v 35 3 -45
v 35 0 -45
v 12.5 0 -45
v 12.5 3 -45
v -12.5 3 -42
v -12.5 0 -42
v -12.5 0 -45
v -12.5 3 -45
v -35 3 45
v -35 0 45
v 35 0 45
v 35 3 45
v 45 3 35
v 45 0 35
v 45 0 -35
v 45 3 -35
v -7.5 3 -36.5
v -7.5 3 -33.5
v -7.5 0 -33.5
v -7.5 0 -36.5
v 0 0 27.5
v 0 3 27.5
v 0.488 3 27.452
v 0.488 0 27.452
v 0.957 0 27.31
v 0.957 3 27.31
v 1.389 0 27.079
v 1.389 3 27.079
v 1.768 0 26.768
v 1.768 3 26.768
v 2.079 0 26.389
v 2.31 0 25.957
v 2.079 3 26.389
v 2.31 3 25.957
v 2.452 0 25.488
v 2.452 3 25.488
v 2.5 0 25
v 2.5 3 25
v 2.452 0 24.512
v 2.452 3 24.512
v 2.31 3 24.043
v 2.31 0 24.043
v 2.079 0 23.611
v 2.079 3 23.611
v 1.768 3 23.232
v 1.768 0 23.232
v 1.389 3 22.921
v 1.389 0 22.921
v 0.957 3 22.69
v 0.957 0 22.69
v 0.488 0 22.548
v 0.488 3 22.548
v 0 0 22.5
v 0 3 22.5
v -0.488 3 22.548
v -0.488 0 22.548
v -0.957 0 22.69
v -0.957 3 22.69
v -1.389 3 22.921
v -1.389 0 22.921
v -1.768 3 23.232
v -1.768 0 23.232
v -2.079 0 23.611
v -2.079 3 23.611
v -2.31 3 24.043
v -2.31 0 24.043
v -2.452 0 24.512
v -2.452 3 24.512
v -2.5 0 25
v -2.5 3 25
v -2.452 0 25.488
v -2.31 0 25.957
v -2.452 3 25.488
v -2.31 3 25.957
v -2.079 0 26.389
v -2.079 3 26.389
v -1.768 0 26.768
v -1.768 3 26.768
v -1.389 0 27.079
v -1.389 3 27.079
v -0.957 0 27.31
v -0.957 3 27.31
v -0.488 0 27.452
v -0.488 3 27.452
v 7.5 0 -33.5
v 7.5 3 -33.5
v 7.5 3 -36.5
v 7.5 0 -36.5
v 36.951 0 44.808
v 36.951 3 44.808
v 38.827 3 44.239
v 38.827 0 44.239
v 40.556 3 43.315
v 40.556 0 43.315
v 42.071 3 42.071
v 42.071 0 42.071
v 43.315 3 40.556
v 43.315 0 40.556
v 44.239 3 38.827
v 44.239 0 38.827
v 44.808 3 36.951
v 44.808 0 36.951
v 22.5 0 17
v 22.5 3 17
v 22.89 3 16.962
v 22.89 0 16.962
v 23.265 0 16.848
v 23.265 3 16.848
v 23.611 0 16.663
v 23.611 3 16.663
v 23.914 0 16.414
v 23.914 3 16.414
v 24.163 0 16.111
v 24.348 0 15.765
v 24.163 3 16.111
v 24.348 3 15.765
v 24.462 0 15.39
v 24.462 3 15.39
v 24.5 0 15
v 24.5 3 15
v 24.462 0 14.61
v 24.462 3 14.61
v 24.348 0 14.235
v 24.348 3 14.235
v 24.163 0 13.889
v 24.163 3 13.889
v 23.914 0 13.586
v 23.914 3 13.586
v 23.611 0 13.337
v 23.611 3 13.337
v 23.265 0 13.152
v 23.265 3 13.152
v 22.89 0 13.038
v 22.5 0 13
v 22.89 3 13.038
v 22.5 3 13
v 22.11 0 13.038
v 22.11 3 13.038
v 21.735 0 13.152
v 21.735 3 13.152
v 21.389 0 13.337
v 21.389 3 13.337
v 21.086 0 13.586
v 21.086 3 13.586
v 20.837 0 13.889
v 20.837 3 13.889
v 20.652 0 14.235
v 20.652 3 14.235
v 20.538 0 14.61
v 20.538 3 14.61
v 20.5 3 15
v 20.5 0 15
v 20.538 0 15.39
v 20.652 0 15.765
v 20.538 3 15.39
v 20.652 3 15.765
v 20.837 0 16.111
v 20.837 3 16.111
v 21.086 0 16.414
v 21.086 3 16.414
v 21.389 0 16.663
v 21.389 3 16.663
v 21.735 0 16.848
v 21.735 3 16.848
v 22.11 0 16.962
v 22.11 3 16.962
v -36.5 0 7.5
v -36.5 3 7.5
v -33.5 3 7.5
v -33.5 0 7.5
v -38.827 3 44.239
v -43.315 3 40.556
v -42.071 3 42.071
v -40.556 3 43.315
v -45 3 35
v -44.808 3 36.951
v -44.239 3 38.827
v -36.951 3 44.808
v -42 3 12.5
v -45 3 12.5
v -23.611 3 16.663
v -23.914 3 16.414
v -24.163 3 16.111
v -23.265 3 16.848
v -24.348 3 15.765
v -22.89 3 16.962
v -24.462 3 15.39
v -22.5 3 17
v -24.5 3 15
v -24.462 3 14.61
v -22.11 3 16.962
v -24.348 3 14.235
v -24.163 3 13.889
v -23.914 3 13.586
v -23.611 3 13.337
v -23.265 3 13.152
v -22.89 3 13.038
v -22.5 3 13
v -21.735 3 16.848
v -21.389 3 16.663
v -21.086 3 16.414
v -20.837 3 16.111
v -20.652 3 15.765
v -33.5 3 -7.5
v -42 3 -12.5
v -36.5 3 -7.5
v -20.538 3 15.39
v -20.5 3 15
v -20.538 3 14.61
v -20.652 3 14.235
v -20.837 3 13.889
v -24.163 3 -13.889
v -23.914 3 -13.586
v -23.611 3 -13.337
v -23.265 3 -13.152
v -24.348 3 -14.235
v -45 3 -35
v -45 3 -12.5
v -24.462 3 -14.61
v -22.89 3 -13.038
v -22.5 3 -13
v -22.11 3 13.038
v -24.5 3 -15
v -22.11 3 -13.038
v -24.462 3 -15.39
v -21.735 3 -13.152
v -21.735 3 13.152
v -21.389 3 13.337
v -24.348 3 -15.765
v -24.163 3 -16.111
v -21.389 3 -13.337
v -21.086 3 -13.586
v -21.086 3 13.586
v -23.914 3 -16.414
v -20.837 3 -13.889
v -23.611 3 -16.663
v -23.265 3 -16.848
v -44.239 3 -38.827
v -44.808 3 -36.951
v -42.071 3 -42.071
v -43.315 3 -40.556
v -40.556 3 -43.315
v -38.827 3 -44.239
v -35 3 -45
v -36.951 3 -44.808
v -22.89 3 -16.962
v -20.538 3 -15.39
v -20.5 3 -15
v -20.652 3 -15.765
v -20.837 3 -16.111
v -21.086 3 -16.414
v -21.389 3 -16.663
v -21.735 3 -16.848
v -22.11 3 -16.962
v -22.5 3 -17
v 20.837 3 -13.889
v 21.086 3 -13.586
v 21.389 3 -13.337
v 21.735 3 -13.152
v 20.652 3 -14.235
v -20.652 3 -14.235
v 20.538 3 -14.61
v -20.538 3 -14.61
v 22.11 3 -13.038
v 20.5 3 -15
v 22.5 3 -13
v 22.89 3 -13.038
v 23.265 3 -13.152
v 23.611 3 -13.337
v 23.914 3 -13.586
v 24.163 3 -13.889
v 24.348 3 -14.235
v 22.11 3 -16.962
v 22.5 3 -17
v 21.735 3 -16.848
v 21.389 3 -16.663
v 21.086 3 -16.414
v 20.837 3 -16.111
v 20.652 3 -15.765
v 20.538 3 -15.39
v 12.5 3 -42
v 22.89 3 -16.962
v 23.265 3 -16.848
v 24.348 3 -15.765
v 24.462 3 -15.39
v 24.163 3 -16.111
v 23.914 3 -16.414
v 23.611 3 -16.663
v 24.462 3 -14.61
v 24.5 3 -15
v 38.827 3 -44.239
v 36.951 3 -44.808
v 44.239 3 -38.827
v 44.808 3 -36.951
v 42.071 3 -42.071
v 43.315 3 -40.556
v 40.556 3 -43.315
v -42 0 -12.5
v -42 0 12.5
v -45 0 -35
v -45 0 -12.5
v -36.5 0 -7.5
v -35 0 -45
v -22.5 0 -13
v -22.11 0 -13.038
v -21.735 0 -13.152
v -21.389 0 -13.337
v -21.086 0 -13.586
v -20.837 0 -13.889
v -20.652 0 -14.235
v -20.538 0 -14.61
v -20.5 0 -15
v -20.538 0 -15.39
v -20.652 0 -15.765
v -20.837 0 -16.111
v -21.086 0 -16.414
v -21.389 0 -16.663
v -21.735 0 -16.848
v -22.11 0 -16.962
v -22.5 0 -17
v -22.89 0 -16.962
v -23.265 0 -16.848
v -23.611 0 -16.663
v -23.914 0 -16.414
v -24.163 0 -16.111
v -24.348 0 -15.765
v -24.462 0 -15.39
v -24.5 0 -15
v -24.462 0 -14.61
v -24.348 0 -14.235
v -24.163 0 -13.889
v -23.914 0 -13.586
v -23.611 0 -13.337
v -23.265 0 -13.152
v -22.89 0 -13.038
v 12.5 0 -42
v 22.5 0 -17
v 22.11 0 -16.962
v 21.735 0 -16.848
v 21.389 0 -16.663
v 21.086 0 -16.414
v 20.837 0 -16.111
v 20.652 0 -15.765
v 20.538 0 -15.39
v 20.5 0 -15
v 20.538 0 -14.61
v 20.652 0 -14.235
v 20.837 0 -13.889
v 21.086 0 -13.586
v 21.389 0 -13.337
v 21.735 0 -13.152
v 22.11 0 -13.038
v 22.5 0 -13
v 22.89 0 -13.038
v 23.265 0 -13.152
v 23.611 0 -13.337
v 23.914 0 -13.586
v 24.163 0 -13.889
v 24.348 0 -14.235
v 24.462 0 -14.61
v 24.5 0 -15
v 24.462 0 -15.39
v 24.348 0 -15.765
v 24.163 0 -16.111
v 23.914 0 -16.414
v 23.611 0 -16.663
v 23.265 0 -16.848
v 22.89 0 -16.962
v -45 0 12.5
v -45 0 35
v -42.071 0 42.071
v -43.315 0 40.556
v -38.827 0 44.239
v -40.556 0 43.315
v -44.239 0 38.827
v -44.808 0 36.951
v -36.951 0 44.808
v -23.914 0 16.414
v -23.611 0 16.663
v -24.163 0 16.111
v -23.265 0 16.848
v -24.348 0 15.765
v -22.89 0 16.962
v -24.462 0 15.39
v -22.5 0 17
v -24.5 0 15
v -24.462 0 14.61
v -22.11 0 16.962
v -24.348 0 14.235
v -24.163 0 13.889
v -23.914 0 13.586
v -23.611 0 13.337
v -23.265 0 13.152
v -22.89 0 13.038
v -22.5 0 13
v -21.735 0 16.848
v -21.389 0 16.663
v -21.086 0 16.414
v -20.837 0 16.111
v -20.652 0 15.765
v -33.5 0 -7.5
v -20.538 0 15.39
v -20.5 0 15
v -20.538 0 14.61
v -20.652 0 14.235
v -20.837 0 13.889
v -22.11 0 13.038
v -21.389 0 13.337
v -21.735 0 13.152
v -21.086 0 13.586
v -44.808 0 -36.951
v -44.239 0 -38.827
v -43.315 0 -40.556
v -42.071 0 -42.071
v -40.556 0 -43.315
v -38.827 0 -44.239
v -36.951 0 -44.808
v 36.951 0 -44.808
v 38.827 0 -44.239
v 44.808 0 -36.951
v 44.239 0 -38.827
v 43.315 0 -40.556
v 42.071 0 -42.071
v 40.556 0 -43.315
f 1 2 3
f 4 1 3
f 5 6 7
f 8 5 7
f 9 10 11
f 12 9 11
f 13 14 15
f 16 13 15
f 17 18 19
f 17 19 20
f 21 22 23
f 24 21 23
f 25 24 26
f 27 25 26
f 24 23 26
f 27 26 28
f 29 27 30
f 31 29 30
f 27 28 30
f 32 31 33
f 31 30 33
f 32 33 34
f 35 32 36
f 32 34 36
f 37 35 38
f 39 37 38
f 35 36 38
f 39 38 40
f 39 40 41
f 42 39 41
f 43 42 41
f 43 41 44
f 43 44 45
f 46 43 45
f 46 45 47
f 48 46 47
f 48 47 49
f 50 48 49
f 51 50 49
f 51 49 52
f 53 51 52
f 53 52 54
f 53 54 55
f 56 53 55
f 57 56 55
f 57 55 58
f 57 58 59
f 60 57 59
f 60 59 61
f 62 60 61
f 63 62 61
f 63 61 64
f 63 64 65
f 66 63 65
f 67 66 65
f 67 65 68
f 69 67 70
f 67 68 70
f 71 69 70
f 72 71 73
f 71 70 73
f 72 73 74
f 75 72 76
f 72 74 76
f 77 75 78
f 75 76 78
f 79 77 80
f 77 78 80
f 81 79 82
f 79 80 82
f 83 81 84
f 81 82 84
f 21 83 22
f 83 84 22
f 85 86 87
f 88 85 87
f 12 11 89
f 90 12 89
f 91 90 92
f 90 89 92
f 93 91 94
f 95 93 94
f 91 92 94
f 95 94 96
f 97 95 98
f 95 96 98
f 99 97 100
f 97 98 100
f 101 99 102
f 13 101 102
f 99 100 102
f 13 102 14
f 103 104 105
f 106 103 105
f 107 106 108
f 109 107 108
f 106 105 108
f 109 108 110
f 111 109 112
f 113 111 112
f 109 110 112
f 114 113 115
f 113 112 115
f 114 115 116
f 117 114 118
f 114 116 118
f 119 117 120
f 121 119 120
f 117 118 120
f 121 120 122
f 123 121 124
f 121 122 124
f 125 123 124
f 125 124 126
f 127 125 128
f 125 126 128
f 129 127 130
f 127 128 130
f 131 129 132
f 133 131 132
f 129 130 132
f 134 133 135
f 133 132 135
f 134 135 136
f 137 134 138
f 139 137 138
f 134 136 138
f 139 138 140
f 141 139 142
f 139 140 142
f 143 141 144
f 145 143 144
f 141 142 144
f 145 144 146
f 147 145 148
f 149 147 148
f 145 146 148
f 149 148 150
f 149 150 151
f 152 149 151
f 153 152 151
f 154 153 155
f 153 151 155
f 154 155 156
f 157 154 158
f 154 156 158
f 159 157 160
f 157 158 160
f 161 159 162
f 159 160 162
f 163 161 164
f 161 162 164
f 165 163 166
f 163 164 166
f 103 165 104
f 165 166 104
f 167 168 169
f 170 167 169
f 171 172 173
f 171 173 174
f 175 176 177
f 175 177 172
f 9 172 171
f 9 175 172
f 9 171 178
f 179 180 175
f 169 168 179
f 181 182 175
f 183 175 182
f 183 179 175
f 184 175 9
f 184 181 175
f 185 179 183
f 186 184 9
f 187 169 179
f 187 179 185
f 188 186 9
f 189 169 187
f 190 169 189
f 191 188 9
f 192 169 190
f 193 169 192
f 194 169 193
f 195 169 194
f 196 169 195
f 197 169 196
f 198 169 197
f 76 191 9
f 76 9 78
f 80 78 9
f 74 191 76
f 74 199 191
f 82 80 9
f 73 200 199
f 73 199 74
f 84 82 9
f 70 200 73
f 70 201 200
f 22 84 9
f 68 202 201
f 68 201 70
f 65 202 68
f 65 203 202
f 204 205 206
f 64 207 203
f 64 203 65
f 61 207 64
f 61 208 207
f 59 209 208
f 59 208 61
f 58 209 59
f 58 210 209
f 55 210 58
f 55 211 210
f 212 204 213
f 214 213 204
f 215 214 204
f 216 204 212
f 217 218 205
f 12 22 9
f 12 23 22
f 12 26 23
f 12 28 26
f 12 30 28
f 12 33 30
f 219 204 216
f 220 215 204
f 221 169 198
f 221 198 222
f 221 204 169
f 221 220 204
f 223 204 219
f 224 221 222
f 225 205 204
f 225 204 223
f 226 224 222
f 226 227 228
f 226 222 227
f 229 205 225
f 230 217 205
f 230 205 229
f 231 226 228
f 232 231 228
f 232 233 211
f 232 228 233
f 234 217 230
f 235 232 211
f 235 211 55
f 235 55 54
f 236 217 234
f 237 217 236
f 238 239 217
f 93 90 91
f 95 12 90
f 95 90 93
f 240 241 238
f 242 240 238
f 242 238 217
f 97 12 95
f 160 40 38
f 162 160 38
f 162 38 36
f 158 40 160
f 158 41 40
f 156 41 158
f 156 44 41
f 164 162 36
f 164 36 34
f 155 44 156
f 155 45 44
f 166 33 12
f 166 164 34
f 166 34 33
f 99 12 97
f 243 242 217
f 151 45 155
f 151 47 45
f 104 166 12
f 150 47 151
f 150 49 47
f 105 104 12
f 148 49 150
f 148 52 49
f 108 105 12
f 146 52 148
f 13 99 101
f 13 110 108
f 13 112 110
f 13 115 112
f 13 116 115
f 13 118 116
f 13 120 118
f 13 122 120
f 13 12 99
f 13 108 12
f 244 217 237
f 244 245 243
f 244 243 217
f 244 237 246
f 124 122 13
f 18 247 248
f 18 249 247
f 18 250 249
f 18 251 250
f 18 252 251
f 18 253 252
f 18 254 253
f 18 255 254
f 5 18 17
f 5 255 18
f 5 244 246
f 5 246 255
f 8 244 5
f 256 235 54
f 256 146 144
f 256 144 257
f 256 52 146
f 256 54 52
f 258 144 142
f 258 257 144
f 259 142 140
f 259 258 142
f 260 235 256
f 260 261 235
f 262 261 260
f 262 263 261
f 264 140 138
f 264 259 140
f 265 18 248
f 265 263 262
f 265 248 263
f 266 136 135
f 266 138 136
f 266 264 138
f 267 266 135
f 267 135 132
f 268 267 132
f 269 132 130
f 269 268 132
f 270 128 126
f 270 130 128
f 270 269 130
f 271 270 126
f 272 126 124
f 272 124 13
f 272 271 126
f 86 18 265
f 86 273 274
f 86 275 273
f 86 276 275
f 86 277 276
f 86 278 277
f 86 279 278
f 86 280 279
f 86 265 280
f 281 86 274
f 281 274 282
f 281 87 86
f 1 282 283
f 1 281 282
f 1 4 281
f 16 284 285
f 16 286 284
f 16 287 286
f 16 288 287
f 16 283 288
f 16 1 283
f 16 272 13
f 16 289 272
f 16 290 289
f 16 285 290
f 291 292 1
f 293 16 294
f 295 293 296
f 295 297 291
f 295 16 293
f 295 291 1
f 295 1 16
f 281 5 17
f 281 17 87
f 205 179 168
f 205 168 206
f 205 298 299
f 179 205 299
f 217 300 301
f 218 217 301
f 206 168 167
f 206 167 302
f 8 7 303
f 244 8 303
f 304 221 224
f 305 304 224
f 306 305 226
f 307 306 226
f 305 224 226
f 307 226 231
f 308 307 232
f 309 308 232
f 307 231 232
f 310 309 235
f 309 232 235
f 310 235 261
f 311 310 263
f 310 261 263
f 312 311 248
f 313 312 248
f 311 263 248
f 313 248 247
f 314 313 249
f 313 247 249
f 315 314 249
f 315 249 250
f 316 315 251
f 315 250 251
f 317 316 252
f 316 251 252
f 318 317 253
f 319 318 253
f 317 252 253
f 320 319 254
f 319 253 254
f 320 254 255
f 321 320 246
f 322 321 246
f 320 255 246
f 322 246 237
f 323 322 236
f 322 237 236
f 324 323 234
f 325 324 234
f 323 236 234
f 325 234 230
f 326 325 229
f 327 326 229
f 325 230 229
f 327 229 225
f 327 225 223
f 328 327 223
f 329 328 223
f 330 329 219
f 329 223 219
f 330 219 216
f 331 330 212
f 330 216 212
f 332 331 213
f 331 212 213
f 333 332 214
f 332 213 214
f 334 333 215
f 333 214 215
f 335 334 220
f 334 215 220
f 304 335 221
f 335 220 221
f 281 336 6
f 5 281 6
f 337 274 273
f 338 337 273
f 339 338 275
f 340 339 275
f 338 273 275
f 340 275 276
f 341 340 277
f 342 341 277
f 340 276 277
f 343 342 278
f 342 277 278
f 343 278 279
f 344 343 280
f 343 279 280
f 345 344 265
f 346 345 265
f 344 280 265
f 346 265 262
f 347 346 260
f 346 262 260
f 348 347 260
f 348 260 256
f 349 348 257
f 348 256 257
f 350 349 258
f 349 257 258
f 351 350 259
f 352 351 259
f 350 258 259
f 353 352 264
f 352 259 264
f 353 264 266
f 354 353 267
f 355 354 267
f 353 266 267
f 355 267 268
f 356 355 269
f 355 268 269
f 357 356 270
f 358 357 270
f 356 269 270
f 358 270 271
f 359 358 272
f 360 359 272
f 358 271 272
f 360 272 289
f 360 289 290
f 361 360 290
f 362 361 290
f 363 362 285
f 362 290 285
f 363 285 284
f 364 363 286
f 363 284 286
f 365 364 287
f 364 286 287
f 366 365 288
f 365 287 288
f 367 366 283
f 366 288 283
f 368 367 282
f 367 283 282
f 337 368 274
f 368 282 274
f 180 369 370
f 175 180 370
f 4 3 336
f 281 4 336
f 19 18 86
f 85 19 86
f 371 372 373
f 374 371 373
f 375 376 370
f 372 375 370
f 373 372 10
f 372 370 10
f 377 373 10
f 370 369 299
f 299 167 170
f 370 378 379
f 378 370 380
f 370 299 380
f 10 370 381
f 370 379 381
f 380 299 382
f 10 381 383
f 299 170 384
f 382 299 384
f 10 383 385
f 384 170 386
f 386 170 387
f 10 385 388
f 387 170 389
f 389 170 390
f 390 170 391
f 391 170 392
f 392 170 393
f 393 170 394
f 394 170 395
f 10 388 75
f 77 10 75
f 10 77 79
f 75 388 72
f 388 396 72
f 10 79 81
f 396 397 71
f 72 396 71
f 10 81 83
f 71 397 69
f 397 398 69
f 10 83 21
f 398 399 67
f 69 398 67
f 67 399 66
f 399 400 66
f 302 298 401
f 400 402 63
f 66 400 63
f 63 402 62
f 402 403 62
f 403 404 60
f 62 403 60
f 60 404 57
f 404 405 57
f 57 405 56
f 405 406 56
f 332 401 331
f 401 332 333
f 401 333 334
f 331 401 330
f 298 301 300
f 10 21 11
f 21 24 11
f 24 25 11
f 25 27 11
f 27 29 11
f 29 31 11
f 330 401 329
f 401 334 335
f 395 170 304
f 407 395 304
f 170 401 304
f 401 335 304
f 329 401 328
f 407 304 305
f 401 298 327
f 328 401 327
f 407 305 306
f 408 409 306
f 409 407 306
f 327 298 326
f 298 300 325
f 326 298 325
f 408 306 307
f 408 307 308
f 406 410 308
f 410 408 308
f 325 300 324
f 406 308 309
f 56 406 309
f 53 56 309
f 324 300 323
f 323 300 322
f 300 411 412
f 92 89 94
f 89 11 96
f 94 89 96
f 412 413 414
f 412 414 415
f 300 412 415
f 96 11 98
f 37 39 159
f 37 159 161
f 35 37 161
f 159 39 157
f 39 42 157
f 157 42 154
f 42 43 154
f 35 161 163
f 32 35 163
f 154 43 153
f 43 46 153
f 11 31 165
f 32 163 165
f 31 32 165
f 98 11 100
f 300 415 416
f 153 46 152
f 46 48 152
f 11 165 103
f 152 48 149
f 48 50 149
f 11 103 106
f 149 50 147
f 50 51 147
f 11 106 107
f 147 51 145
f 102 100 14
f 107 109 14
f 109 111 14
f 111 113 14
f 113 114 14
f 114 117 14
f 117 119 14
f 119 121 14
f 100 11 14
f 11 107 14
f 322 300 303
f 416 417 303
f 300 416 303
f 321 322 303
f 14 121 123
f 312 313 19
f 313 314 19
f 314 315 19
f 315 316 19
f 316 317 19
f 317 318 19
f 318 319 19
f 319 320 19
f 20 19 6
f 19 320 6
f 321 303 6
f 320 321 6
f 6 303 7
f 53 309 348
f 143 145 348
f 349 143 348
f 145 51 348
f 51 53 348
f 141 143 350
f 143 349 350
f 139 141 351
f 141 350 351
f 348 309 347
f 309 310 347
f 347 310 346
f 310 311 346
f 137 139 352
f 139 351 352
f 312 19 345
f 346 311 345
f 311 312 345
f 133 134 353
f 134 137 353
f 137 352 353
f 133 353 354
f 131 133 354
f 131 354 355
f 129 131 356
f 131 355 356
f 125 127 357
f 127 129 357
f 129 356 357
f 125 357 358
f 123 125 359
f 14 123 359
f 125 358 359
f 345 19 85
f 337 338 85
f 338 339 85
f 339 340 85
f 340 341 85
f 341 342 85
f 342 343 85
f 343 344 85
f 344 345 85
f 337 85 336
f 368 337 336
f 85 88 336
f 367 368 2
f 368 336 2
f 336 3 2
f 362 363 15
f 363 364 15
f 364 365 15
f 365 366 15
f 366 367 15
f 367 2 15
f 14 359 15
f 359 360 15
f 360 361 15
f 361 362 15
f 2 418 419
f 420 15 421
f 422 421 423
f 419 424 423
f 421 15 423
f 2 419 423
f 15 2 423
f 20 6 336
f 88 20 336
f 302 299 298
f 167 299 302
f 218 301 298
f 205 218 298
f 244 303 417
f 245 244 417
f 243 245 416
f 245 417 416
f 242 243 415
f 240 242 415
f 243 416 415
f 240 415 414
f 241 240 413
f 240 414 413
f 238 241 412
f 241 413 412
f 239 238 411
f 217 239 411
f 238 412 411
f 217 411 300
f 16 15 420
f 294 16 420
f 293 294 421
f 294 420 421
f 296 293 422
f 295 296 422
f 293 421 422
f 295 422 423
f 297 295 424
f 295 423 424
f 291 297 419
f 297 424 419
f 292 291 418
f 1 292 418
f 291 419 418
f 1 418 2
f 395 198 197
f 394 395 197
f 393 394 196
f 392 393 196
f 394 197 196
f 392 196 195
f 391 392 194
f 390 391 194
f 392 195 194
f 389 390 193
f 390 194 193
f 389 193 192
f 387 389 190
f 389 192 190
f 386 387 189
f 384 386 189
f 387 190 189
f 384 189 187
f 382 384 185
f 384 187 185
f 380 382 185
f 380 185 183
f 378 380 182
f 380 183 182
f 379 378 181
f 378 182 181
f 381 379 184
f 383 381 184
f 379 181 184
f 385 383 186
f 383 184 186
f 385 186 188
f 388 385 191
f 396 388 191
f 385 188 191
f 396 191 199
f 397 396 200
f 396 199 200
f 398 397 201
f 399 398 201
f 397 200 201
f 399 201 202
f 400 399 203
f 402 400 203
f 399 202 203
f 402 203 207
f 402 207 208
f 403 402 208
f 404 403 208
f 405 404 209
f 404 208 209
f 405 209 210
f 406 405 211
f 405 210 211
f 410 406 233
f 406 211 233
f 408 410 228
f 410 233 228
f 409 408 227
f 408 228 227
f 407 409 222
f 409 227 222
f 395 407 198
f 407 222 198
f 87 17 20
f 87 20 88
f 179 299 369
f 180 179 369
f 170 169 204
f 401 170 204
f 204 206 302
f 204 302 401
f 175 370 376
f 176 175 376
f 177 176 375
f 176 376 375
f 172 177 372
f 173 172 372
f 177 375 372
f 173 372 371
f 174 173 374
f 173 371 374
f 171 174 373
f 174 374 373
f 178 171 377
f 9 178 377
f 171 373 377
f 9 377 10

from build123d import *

# Parameters (mm, degrees)
BOSS_EXTRUDE1_DEPTH = 3
SKETCH2_R           = 2
CUT_EXTRUDE1_DEPTH  = 3
SKETCH3_W           = 15
SKETCH3_H           = 3
SKETCH3_W_2         = 3
SKETCH3_H_2         = 15
CUT_EXTRUDE2_DEPTH  = 10
SKETCH4_R           = 2.5
CUT_EXTRUDE3_DEPTH  = 14


with BuildPart() as part:
    # Sketch1 → Boss-Extrude1 (new body)
    with BuildSketch(Plane(origin=(0, 0, 0), x_dir=(1, 0, 0), z_dir=(0, 1, 0))):
        with BuildLine():
            Line((-35, -45), (35, -45))
            ThreePointArc((35, -45), (42.071067812, -42.071067812), (45, -35))
            Line((45, -35), (45, 35))
            ThreePointArc((45, 35), (42.071067812, 42.071067812), (35, 45))
            Line((35, 45), (12.5, 45))
            Line((12.5, 45), (12.5, 42))
            Line((12.5, 42), (-12.5, 42))
            Line((-12.5, 42), (-12.5, 45))
            Line((-12.5, 45), (-35, 45))
            ThreePointArc((-35, 45), (-42.071067812, 42.071067812), (-45, 35))
            Line((-45, 35), (-45, 12.5))
            Line((-45, 12.5), (-42, 12.5))
            Line((-42, 12.5), (-42, -12.5))
            Line((-42, -12.5), (-45, -12.5))
            Line((-45, -12.5), (-45, -35))
            ThreePointArc((-45, -35), (-42.071067812, -42.071067812), (-35, -45))
        make_face()
    extrude(amount=BOSS_EXTRUDE1_DEPTH)

    # Sketch2 → Cut-Extrude1 (cut)
    with BuildSketch(Plane(origin=(0, 3, 0), x_dir=(1, 0, 0), z_dir=(0, 1, 0))):
        with Locations(Location((-22.5, 15, 0), (0, 0, 270))):
            Circle(SKETCH2_R)
        with Locations(Location((22.5, 15, 0), (0, 0, 90))):
            Circle(SKETCH2_R)
        with Locations(Location((22.5, -15, 0), (0, 0, 270))):
            Circle(SKETCH2_R)
        with Locations(Location((-22.5, -15, 0), (0, 0, 90))):
            Circle(SKETCH2_R)
    extrude(amount=-CUT_EXTRUDE1_DEPTH, mode=Mode.SUBTRACT)

    # Sketch3 → Cut-Extrude2 (cut)
    with BuildSketch(Plane(origin=(0, 3, 0), x_dir=(1, 0, 0), z_dir=(0, 1, 0))):
        with Locations((0, 35)):
            Rectangle(SKETCH3_W, SKETCH3_H)
        with Locations((-35, 0)):
            Rectangle(SKETCH3_W_2, SKETCH3_H_2)
    extrude(amount=-CUT_EXTRUDE2_DEPTH, mode=Mode.SUBTRACT)

    # Sketch4 → Cut-Extrude3 (cut)
    with BuildSketch(Plane(origin=(0, 3, 0), x_dir=(1, 0, 0), z_dir=(0, 1, 0))):
        with Locations(Location((0, -25, 0), (0, 0, 270))):
            Circle(SKETCH4_R)
    extrude(amount=-CUT_EXTRUDE3_DEPTH, mode=Mode.SUBTRACT)


solid = part.part
